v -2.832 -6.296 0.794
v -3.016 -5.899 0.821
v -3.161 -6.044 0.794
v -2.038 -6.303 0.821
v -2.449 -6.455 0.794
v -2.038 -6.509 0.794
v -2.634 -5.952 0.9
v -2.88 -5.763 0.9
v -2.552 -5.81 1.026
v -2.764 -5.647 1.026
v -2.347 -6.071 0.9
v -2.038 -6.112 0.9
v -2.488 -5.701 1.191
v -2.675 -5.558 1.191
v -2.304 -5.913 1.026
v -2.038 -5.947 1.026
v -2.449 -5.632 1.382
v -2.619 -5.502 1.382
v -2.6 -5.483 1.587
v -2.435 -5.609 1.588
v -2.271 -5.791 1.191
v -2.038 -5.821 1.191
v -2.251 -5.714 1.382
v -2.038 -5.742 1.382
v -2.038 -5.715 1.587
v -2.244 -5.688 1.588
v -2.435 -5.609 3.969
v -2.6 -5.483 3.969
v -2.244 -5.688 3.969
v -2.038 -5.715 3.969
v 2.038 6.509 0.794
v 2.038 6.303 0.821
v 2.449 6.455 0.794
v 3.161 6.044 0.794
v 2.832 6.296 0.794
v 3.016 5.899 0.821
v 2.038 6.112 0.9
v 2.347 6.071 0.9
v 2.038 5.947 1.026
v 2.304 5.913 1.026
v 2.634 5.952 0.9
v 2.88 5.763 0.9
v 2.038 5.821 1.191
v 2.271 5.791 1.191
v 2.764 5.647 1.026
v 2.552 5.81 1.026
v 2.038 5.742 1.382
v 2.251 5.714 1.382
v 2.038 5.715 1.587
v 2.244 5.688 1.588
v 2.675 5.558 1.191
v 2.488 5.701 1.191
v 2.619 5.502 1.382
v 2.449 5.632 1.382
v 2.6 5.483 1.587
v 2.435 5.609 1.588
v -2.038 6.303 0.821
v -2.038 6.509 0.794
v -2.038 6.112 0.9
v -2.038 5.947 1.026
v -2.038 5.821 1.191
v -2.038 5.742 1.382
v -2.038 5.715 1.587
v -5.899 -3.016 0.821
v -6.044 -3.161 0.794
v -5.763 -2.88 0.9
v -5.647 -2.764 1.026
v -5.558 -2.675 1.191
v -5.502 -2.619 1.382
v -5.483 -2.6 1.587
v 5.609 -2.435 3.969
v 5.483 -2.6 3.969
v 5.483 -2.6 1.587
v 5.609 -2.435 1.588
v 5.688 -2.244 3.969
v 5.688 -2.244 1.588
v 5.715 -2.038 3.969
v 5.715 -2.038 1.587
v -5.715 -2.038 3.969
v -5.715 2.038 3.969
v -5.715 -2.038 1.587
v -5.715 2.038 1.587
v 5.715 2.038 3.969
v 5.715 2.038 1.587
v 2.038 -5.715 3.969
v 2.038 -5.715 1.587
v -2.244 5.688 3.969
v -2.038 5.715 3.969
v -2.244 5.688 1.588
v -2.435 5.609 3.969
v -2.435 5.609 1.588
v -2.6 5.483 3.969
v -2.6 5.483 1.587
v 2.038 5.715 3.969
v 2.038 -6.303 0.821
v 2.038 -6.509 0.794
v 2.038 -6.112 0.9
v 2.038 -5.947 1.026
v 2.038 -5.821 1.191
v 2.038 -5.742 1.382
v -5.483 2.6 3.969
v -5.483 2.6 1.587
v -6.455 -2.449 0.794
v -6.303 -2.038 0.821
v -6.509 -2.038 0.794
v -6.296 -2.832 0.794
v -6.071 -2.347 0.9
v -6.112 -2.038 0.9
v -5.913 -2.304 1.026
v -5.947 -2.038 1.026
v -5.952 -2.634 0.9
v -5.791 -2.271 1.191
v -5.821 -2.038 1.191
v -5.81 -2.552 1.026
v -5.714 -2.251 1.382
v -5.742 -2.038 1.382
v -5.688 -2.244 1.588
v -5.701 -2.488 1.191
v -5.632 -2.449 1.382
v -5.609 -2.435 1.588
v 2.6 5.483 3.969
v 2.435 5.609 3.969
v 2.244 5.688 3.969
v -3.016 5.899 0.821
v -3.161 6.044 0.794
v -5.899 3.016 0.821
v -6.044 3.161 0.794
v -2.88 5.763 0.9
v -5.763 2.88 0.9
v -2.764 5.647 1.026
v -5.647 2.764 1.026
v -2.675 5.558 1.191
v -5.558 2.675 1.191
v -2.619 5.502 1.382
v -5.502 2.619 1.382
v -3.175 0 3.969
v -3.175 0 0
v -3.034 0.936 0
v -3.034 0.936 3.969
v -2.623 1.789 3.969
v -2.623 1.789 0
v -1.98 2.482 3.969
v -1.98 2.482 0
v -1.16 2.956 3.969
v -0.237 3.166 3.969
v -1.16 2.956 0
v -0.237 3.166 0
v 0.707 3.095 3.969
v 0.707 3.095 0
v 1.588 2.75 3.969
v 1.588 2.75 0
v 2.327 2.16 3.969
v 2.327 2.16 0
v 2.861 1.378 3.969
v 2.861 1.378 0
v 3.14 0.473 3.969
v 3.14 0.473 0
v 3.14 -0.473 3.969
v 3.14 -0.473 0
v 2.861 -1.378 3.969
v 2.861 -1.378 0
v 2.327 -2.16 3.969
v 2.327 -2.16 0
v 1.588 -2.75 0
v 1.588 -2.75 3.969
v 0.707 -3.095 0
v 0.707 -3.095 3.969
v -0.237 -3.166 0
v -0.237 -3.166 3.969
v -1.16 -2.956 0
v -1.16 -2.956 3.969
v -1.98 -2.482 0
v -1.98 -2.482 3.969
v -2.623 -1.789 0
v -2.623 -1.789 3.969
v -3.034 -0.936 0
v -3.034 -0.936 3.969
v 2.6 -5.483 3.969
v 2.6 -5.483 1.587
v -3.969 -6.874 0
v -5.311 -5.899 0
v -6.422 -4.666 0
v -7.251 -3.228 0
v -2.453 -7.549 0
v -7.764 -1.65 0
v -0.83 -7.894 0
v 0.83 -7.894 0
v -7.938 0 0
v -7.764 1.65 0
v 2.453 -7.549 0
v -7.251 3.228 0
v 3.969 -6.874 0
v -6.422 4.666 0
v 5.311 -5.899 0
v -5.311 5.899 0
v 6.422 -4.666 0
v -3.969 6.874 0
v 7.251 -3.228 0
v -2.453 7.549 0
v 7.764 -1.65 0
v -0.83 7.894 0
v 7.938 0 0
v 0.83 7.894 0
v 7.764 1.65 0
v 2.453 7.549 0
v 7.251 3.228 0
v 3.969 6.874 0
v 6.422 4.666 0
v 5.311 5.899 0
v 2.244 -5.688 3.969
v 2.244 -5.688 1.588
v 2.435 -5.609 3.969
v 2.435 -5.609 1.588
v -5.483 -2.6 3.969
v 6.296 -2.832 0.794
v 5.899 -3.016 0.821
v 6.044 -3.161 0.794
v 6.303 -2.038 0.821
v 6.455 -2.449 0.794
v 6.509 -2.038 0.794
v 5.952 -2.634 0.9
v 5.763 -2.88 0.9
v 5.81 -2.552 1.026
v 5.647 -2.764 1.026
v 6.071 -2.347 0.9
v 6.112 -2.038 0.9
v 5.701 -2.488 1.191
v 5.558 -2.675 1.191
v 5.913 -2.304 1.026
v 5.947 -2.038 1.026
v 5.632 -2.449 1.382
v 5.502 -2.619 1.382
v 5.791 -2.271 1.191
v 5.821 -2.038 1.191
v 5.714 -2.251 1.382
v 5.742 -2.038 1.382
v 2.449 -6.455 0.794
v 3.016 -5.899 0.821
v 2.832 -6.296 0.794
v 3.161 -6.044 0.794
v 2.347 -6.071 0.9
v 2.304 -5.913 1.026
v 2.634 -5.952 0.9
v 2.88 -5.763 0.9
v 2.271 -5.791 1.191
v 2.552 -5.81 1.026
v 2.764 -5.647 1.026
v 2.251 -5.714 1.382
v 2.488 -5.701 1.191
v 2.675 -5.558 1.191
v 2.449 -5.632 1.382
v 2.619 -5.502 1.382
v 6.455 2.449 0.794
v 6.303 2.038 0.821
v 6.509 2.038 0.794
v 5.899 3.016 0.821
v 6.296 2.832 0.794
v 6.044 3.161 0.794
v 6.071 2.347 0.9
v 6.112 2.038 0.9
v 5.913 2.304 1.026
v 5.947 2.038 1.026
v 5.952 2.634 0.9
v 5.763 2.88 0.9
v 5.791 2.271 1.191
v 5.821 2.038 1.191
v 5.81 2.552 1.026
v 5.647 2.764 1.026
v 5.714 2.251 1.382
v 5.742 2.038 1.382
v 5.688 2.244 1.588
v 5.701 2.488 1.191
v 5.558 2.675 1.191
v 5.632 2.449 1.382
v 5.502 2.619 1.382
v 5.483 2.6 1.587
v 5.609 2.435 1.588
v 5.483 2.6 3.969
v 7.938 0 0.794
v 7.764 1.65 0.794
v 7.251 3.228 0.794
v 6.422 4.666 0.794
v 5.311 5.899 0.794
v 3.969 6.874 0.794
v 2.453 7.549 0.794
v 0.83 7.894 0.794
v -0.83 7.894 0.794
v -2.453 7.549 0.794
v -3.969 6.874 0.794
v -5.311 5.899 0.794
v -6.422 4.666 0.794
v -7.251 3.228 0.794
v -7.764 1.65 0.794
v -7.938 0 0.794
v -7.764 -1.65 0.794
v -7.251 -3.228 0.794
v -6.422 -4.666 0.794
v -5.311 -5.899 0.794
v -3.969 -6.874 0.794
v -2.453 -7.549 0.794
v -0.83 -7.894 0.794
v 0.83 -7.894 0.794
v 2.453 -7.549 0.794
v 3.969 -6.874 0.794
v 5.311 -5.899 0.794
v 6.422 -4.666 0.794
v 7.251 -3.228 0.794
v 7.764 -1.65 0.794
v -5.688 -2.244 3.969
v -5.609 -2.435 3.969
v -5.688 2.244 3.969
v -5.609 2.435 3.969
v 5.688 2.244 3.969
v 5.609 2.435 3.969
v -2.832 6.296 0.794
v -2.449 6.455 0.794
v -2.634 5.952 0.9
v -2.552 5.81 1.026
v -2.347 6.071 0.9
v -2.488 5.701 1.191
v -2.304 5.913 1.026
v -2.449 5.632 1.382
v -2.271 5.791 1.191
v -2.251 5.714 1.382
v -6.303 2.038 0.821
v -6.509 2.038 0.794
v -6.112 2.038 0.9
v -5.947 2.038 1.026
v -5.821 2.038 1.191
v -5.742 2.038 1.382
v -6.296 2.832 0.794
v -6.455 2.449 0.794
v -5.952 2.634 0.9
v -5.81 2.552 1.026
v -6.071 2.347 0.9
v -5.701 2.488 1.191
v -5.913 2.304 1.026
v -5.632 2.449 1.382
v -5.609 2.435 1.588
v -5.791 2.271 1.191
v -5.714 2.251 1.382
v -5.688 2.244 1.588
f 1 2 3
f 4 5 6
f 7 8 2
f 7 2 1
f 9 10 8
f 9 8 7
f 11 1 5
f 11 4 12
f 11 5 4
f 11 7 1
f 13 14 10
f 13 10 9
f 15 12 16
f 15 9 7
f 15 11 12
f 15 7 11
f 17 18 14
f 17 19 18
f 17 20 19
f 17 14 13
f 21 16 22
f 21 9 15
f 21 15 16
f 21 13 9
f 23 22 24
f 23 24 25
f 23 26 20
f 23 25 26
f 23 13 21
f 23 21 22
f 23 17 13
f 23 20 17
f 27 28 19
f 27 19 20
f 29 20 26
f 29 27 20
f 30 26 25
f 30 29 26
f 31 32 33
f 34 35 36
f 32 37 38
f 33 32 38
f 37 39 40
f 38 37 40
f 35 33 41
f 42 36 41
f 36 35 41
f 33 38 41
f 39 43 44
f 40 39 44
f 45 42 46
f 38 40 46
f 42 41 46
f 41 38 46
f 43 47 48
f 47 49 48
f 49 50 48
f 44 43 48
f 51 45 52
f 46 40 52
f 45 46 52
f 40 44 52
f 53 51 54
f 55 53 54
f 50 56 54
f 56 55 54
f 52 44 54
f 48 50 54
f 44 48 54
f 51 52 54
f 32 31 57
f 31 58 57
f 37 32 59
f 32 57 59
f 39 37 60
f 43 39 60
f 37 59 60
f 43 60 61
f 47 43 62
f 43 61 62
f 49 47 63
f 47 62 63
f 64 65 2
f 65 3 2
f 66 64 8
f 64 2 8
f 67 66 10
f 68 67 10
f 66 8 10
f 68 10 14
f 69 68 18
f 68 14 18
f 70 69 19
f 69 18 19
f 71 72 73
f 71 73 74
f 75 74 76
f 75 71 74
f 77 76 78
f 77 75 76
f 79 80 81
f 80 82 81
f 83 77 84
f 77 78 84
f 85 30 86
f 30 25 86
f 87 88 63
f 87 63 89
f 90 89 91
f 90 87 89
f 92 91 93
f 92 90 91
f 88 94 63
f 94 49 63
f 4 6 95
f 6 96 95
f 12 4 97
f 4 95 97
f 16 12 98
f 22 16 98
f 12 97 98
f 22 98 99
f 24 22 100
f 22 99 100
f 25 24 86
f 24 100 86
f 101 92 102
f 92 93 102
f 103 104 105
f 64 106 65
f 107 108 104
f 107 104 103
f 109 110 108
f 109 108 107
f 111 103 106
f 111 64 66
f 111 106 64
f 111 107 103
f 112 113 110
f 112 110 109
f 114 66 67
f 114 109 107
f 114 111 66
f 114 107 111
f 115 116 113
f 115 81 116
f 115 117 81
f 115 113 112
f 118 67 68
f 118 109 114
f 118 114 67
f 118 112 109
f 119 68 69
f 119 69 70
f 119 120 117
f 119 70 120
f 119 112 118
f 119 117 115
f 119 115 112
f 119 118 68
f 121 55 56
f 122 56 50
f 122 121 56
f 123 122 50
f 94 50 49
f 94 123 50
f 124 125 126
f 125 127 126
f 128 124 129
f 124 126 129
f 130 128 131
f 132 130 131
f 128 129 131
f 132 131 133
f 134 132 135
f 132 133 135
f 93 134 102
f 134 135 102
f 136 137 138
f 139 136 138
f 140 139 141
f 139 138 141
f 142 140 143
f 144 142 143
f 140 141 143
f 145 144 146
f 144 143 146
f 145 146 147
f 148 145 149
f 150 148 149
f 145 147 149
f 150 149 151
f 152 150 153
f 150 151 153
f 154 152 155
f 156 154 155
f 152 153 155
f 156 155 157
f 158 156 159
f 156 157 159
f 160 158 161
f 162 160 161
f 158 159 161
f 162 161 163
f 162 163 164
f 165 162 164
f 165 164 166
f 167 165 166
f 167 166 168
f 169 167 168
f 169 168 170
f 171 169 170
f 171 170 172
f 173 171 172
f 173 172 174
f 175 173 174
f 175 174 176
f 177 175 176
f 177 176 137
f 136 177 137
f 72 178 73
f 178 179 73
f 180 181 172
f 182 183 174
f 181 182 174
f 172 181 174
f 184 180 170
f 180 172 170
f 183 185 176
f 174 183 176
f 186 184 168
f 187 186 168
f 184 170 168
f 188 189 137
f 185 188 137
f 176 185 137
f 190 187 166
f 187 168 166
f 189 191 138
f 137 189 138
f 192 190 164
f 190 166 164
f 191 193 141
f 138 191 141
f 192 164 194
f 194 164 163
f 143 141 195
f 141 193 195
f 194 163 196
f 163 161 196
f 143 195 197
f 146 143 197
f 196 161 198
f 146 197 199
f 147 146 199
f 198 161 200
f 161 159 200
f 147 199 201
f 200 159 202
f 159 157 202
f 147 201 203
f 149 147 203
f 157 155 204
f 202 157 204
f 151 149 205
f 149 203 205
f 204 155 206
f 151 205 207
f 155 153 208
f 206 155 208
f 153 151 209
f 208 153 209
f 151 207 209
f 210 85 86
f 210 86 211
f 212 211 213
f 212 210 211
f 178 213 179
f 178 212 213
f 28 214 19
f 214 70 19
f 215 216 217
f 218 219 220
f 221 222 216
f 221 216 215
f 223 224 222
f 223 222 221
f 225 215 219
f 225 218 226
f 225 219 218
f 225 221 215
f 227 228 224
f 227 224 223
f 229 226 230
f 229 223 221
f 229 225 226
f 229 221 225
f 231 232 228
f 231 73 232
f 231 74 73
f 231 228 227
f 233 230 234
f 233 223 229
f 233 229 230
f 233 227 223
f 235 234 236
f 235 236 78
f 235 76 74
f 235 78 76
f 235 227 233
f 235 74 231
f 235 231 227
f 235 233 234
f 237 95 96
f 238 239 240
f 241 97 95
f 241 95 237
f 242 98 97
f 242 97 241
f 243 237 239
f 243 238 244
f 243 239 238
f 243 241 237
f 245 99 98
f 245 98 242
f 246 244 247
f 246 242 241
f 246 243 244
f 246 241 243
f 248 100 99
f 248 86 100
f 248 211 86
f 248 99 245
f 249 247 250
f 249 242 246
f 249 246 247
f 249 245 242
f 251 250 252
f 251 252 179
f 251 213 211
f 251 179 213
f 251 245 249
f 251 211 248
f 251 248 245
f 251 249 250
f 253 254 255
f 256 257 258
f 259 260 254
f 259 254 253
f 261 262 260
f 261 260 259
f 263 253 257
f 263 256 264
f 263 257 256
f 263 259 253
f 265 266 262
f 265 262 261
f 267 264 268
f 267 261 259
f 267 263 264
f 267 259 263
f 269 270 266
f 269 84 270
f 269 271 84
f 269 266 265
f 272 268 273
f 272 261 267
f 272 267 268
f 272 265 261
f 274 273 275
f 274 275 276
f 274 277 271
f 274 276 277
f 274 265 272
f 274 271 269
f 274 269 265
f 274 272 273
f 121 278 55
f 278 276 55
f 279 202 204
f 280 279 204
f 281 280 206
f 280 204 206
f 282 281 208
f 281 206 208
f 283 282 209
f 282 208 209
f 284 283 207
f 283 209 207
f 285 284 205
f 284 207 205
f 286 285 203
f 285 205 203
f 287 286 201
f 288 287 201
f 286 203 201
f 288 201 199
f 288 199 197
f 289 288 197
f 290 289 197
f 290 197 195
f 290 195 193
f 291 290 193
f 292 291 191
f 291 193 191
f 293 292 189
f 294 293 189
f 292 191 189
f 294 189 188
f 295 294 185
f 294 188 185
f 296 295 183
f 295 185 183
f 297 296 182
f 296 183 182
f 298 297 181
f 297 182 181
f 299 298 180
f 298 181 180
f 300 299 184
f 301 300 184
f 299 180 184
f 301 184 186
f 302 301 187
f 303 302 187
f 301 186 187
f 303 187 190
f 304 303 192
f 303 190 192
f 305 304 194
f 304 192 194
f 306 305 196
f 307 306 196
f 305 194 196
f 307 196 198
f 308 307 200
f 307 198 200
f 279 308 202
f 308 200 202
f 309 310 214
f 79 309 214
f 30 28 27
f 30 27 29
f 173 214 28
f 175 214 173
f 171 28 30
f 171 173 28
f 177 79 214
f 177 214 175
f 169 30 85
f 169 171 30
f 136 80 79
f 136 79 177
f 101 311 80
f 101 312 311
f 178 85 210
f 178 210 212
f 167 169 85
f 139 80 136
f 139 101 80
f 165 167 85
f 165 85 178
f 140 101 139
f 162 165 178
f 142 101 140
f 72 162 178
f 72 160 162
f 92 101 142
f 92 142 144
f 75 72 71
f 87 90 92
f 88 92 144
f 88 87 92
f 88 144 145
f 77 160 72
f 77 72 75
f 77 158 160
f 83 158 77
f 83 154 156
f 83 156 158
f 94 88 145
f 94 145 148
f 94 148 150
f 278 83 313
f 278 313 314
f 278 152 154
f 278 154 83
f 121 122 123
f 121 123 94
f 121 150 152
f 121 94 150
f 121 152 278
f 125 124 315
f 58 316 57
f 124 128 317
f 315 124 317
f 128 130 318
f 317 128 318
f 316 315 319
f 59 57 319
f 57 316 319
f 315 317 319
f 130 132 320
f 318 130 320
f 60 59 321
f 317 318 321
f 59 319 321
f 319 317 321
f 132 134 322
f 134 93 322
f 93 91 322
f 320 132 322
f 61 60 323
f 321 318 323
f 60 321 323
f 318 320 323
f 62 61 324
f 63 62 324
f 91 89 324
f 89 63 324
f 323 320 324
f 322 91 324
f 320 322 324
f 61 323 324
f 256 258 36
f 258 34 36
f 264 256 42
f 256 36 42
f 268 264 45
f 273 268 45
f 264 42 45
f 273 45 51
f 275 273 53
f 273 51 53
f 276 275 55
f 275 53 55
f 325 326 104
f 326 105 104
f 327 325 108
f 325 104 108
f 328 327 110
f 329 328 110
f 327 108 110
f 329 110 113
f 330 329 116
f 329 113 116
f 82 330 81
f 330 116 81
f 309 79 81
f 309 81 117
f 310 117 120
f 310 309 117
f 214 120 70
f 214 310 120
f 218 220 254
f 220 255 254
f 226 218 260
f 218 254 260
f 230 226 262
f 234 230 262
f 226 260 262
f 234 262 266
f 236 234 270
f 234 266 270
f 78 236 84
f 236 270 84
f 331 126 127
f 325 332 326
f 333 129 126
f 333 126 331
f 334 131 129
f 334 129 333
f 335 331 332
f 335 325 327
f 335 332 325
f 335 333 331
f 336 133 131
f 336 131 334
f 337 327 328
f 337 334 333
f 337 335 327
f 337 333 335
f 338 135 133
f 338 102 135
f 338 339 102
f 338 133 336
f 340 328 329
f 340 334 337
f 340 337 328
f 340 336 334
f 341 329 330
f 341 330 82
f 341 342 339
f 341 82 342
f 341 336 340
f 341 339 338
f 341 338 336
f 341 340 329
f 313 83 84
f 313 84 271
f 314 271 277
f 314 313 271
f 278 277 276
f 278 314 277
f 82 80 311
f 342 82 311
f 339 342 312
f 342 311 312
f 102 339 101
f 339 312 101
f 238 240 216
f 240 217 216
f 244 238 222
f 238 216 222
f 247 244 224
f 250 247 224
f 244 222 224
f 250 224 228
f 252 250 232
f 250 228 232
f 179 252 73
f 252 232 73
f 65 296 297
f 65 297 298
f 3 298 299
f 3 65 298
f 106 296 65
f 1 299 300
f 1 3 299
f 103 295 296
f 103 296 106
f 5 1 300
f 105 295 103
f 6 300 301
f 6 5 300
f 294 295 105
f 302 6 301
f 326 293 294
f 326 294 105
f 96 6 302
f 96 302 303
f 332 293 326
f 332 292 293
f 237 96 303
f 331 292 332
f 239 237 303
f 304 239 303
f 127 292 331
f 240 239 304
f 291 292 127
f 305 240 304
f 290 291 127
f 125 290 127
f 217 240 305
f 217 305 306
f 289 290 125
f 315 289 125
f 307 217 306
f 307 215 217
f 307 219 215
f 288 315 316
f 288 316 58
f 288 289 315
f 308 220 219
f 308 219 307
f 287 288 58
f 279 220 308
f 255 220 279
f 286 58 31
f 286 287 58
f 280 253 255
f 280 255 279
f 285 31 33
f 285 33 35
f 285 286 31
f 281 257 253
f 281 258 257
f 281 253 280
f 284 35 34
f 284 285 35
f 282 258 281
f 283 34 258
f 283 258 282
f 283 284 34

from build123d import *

# Parameters (mm, degrees)
F0_R     = 7.9375
F1_DEPTH = 0.79375
F3_DEPTH = 3.175
F4_R     = 0.79375
F6_D     = 6.35
F6_DEPTH = 19.05
F6_TIP   = 1.9077324654


with BuildPart() as f1:
    # F0 (on Top) → F1 (new body)
    with BuildSketch(Plane.XY):
        Circle(F0_R)
    extrude(amount=F1_DEPTH)

    # F2 (on face) → F3 (join)
    with BuildSketch(Plane.XY.offset(0.79375)):
        Polygon((-5.715, 2.367230509), (-5.715, -2.367230509), (-2.367230509, -5.715), (2.367230509, -5.715), (5.715, -2.367230509), (5.715, 2.367230509), (2.367230509, 5.715), (-2.367230509, 5.715), align=None)
    extrude(amount=F3_DEPTH)

    # F4
    f4_edges = [f1.edges().sort_by_distance(p)[0] for p in [
        (-5.715, -2.367231, 2.38125),
        (-2.367231, -5.715, 2.38125),
        (2.367231, -5.715, 2.38125),
        (5.715, -2.367231, 2.38125),
        (5.715, 2.367231, 2.38125),
        (2.367231, 5.715, 2.38125),
        (-2.367231, 5.715, 2.38125),
        (-5.715, 2.367231, 2.38125),
        (-4.041115, 4.041115, 0.79375),
        (0, 5.715, 0.79375),
        (-5.715, 0, 0.79375),
        (-4.041115, -4.041115, 0.79375),
        (0, -5.715, 0.79375),
        (4.041115, -4.041115, 0.79375),
        (5.715, 0, 0.79375),
        (4.041115, 4.041115, 0.79375),
    ]]
    fillet(f4_edges, radius=F4_R)

    # F6
    with Locations(Plane.XY.offset(3.96875)):
        with Locations((0, 0)):
            Hole(F6_D / 2, depth=F6_DEPTH)
            with Locations((0, 0, -(F6_DEPTH + F6_TIP / 2))):  # 118° drill point
                Cone(0, F6_D / 2, F6_TIP, mode=Mode.SUBTRACT)


solid = f1.part
